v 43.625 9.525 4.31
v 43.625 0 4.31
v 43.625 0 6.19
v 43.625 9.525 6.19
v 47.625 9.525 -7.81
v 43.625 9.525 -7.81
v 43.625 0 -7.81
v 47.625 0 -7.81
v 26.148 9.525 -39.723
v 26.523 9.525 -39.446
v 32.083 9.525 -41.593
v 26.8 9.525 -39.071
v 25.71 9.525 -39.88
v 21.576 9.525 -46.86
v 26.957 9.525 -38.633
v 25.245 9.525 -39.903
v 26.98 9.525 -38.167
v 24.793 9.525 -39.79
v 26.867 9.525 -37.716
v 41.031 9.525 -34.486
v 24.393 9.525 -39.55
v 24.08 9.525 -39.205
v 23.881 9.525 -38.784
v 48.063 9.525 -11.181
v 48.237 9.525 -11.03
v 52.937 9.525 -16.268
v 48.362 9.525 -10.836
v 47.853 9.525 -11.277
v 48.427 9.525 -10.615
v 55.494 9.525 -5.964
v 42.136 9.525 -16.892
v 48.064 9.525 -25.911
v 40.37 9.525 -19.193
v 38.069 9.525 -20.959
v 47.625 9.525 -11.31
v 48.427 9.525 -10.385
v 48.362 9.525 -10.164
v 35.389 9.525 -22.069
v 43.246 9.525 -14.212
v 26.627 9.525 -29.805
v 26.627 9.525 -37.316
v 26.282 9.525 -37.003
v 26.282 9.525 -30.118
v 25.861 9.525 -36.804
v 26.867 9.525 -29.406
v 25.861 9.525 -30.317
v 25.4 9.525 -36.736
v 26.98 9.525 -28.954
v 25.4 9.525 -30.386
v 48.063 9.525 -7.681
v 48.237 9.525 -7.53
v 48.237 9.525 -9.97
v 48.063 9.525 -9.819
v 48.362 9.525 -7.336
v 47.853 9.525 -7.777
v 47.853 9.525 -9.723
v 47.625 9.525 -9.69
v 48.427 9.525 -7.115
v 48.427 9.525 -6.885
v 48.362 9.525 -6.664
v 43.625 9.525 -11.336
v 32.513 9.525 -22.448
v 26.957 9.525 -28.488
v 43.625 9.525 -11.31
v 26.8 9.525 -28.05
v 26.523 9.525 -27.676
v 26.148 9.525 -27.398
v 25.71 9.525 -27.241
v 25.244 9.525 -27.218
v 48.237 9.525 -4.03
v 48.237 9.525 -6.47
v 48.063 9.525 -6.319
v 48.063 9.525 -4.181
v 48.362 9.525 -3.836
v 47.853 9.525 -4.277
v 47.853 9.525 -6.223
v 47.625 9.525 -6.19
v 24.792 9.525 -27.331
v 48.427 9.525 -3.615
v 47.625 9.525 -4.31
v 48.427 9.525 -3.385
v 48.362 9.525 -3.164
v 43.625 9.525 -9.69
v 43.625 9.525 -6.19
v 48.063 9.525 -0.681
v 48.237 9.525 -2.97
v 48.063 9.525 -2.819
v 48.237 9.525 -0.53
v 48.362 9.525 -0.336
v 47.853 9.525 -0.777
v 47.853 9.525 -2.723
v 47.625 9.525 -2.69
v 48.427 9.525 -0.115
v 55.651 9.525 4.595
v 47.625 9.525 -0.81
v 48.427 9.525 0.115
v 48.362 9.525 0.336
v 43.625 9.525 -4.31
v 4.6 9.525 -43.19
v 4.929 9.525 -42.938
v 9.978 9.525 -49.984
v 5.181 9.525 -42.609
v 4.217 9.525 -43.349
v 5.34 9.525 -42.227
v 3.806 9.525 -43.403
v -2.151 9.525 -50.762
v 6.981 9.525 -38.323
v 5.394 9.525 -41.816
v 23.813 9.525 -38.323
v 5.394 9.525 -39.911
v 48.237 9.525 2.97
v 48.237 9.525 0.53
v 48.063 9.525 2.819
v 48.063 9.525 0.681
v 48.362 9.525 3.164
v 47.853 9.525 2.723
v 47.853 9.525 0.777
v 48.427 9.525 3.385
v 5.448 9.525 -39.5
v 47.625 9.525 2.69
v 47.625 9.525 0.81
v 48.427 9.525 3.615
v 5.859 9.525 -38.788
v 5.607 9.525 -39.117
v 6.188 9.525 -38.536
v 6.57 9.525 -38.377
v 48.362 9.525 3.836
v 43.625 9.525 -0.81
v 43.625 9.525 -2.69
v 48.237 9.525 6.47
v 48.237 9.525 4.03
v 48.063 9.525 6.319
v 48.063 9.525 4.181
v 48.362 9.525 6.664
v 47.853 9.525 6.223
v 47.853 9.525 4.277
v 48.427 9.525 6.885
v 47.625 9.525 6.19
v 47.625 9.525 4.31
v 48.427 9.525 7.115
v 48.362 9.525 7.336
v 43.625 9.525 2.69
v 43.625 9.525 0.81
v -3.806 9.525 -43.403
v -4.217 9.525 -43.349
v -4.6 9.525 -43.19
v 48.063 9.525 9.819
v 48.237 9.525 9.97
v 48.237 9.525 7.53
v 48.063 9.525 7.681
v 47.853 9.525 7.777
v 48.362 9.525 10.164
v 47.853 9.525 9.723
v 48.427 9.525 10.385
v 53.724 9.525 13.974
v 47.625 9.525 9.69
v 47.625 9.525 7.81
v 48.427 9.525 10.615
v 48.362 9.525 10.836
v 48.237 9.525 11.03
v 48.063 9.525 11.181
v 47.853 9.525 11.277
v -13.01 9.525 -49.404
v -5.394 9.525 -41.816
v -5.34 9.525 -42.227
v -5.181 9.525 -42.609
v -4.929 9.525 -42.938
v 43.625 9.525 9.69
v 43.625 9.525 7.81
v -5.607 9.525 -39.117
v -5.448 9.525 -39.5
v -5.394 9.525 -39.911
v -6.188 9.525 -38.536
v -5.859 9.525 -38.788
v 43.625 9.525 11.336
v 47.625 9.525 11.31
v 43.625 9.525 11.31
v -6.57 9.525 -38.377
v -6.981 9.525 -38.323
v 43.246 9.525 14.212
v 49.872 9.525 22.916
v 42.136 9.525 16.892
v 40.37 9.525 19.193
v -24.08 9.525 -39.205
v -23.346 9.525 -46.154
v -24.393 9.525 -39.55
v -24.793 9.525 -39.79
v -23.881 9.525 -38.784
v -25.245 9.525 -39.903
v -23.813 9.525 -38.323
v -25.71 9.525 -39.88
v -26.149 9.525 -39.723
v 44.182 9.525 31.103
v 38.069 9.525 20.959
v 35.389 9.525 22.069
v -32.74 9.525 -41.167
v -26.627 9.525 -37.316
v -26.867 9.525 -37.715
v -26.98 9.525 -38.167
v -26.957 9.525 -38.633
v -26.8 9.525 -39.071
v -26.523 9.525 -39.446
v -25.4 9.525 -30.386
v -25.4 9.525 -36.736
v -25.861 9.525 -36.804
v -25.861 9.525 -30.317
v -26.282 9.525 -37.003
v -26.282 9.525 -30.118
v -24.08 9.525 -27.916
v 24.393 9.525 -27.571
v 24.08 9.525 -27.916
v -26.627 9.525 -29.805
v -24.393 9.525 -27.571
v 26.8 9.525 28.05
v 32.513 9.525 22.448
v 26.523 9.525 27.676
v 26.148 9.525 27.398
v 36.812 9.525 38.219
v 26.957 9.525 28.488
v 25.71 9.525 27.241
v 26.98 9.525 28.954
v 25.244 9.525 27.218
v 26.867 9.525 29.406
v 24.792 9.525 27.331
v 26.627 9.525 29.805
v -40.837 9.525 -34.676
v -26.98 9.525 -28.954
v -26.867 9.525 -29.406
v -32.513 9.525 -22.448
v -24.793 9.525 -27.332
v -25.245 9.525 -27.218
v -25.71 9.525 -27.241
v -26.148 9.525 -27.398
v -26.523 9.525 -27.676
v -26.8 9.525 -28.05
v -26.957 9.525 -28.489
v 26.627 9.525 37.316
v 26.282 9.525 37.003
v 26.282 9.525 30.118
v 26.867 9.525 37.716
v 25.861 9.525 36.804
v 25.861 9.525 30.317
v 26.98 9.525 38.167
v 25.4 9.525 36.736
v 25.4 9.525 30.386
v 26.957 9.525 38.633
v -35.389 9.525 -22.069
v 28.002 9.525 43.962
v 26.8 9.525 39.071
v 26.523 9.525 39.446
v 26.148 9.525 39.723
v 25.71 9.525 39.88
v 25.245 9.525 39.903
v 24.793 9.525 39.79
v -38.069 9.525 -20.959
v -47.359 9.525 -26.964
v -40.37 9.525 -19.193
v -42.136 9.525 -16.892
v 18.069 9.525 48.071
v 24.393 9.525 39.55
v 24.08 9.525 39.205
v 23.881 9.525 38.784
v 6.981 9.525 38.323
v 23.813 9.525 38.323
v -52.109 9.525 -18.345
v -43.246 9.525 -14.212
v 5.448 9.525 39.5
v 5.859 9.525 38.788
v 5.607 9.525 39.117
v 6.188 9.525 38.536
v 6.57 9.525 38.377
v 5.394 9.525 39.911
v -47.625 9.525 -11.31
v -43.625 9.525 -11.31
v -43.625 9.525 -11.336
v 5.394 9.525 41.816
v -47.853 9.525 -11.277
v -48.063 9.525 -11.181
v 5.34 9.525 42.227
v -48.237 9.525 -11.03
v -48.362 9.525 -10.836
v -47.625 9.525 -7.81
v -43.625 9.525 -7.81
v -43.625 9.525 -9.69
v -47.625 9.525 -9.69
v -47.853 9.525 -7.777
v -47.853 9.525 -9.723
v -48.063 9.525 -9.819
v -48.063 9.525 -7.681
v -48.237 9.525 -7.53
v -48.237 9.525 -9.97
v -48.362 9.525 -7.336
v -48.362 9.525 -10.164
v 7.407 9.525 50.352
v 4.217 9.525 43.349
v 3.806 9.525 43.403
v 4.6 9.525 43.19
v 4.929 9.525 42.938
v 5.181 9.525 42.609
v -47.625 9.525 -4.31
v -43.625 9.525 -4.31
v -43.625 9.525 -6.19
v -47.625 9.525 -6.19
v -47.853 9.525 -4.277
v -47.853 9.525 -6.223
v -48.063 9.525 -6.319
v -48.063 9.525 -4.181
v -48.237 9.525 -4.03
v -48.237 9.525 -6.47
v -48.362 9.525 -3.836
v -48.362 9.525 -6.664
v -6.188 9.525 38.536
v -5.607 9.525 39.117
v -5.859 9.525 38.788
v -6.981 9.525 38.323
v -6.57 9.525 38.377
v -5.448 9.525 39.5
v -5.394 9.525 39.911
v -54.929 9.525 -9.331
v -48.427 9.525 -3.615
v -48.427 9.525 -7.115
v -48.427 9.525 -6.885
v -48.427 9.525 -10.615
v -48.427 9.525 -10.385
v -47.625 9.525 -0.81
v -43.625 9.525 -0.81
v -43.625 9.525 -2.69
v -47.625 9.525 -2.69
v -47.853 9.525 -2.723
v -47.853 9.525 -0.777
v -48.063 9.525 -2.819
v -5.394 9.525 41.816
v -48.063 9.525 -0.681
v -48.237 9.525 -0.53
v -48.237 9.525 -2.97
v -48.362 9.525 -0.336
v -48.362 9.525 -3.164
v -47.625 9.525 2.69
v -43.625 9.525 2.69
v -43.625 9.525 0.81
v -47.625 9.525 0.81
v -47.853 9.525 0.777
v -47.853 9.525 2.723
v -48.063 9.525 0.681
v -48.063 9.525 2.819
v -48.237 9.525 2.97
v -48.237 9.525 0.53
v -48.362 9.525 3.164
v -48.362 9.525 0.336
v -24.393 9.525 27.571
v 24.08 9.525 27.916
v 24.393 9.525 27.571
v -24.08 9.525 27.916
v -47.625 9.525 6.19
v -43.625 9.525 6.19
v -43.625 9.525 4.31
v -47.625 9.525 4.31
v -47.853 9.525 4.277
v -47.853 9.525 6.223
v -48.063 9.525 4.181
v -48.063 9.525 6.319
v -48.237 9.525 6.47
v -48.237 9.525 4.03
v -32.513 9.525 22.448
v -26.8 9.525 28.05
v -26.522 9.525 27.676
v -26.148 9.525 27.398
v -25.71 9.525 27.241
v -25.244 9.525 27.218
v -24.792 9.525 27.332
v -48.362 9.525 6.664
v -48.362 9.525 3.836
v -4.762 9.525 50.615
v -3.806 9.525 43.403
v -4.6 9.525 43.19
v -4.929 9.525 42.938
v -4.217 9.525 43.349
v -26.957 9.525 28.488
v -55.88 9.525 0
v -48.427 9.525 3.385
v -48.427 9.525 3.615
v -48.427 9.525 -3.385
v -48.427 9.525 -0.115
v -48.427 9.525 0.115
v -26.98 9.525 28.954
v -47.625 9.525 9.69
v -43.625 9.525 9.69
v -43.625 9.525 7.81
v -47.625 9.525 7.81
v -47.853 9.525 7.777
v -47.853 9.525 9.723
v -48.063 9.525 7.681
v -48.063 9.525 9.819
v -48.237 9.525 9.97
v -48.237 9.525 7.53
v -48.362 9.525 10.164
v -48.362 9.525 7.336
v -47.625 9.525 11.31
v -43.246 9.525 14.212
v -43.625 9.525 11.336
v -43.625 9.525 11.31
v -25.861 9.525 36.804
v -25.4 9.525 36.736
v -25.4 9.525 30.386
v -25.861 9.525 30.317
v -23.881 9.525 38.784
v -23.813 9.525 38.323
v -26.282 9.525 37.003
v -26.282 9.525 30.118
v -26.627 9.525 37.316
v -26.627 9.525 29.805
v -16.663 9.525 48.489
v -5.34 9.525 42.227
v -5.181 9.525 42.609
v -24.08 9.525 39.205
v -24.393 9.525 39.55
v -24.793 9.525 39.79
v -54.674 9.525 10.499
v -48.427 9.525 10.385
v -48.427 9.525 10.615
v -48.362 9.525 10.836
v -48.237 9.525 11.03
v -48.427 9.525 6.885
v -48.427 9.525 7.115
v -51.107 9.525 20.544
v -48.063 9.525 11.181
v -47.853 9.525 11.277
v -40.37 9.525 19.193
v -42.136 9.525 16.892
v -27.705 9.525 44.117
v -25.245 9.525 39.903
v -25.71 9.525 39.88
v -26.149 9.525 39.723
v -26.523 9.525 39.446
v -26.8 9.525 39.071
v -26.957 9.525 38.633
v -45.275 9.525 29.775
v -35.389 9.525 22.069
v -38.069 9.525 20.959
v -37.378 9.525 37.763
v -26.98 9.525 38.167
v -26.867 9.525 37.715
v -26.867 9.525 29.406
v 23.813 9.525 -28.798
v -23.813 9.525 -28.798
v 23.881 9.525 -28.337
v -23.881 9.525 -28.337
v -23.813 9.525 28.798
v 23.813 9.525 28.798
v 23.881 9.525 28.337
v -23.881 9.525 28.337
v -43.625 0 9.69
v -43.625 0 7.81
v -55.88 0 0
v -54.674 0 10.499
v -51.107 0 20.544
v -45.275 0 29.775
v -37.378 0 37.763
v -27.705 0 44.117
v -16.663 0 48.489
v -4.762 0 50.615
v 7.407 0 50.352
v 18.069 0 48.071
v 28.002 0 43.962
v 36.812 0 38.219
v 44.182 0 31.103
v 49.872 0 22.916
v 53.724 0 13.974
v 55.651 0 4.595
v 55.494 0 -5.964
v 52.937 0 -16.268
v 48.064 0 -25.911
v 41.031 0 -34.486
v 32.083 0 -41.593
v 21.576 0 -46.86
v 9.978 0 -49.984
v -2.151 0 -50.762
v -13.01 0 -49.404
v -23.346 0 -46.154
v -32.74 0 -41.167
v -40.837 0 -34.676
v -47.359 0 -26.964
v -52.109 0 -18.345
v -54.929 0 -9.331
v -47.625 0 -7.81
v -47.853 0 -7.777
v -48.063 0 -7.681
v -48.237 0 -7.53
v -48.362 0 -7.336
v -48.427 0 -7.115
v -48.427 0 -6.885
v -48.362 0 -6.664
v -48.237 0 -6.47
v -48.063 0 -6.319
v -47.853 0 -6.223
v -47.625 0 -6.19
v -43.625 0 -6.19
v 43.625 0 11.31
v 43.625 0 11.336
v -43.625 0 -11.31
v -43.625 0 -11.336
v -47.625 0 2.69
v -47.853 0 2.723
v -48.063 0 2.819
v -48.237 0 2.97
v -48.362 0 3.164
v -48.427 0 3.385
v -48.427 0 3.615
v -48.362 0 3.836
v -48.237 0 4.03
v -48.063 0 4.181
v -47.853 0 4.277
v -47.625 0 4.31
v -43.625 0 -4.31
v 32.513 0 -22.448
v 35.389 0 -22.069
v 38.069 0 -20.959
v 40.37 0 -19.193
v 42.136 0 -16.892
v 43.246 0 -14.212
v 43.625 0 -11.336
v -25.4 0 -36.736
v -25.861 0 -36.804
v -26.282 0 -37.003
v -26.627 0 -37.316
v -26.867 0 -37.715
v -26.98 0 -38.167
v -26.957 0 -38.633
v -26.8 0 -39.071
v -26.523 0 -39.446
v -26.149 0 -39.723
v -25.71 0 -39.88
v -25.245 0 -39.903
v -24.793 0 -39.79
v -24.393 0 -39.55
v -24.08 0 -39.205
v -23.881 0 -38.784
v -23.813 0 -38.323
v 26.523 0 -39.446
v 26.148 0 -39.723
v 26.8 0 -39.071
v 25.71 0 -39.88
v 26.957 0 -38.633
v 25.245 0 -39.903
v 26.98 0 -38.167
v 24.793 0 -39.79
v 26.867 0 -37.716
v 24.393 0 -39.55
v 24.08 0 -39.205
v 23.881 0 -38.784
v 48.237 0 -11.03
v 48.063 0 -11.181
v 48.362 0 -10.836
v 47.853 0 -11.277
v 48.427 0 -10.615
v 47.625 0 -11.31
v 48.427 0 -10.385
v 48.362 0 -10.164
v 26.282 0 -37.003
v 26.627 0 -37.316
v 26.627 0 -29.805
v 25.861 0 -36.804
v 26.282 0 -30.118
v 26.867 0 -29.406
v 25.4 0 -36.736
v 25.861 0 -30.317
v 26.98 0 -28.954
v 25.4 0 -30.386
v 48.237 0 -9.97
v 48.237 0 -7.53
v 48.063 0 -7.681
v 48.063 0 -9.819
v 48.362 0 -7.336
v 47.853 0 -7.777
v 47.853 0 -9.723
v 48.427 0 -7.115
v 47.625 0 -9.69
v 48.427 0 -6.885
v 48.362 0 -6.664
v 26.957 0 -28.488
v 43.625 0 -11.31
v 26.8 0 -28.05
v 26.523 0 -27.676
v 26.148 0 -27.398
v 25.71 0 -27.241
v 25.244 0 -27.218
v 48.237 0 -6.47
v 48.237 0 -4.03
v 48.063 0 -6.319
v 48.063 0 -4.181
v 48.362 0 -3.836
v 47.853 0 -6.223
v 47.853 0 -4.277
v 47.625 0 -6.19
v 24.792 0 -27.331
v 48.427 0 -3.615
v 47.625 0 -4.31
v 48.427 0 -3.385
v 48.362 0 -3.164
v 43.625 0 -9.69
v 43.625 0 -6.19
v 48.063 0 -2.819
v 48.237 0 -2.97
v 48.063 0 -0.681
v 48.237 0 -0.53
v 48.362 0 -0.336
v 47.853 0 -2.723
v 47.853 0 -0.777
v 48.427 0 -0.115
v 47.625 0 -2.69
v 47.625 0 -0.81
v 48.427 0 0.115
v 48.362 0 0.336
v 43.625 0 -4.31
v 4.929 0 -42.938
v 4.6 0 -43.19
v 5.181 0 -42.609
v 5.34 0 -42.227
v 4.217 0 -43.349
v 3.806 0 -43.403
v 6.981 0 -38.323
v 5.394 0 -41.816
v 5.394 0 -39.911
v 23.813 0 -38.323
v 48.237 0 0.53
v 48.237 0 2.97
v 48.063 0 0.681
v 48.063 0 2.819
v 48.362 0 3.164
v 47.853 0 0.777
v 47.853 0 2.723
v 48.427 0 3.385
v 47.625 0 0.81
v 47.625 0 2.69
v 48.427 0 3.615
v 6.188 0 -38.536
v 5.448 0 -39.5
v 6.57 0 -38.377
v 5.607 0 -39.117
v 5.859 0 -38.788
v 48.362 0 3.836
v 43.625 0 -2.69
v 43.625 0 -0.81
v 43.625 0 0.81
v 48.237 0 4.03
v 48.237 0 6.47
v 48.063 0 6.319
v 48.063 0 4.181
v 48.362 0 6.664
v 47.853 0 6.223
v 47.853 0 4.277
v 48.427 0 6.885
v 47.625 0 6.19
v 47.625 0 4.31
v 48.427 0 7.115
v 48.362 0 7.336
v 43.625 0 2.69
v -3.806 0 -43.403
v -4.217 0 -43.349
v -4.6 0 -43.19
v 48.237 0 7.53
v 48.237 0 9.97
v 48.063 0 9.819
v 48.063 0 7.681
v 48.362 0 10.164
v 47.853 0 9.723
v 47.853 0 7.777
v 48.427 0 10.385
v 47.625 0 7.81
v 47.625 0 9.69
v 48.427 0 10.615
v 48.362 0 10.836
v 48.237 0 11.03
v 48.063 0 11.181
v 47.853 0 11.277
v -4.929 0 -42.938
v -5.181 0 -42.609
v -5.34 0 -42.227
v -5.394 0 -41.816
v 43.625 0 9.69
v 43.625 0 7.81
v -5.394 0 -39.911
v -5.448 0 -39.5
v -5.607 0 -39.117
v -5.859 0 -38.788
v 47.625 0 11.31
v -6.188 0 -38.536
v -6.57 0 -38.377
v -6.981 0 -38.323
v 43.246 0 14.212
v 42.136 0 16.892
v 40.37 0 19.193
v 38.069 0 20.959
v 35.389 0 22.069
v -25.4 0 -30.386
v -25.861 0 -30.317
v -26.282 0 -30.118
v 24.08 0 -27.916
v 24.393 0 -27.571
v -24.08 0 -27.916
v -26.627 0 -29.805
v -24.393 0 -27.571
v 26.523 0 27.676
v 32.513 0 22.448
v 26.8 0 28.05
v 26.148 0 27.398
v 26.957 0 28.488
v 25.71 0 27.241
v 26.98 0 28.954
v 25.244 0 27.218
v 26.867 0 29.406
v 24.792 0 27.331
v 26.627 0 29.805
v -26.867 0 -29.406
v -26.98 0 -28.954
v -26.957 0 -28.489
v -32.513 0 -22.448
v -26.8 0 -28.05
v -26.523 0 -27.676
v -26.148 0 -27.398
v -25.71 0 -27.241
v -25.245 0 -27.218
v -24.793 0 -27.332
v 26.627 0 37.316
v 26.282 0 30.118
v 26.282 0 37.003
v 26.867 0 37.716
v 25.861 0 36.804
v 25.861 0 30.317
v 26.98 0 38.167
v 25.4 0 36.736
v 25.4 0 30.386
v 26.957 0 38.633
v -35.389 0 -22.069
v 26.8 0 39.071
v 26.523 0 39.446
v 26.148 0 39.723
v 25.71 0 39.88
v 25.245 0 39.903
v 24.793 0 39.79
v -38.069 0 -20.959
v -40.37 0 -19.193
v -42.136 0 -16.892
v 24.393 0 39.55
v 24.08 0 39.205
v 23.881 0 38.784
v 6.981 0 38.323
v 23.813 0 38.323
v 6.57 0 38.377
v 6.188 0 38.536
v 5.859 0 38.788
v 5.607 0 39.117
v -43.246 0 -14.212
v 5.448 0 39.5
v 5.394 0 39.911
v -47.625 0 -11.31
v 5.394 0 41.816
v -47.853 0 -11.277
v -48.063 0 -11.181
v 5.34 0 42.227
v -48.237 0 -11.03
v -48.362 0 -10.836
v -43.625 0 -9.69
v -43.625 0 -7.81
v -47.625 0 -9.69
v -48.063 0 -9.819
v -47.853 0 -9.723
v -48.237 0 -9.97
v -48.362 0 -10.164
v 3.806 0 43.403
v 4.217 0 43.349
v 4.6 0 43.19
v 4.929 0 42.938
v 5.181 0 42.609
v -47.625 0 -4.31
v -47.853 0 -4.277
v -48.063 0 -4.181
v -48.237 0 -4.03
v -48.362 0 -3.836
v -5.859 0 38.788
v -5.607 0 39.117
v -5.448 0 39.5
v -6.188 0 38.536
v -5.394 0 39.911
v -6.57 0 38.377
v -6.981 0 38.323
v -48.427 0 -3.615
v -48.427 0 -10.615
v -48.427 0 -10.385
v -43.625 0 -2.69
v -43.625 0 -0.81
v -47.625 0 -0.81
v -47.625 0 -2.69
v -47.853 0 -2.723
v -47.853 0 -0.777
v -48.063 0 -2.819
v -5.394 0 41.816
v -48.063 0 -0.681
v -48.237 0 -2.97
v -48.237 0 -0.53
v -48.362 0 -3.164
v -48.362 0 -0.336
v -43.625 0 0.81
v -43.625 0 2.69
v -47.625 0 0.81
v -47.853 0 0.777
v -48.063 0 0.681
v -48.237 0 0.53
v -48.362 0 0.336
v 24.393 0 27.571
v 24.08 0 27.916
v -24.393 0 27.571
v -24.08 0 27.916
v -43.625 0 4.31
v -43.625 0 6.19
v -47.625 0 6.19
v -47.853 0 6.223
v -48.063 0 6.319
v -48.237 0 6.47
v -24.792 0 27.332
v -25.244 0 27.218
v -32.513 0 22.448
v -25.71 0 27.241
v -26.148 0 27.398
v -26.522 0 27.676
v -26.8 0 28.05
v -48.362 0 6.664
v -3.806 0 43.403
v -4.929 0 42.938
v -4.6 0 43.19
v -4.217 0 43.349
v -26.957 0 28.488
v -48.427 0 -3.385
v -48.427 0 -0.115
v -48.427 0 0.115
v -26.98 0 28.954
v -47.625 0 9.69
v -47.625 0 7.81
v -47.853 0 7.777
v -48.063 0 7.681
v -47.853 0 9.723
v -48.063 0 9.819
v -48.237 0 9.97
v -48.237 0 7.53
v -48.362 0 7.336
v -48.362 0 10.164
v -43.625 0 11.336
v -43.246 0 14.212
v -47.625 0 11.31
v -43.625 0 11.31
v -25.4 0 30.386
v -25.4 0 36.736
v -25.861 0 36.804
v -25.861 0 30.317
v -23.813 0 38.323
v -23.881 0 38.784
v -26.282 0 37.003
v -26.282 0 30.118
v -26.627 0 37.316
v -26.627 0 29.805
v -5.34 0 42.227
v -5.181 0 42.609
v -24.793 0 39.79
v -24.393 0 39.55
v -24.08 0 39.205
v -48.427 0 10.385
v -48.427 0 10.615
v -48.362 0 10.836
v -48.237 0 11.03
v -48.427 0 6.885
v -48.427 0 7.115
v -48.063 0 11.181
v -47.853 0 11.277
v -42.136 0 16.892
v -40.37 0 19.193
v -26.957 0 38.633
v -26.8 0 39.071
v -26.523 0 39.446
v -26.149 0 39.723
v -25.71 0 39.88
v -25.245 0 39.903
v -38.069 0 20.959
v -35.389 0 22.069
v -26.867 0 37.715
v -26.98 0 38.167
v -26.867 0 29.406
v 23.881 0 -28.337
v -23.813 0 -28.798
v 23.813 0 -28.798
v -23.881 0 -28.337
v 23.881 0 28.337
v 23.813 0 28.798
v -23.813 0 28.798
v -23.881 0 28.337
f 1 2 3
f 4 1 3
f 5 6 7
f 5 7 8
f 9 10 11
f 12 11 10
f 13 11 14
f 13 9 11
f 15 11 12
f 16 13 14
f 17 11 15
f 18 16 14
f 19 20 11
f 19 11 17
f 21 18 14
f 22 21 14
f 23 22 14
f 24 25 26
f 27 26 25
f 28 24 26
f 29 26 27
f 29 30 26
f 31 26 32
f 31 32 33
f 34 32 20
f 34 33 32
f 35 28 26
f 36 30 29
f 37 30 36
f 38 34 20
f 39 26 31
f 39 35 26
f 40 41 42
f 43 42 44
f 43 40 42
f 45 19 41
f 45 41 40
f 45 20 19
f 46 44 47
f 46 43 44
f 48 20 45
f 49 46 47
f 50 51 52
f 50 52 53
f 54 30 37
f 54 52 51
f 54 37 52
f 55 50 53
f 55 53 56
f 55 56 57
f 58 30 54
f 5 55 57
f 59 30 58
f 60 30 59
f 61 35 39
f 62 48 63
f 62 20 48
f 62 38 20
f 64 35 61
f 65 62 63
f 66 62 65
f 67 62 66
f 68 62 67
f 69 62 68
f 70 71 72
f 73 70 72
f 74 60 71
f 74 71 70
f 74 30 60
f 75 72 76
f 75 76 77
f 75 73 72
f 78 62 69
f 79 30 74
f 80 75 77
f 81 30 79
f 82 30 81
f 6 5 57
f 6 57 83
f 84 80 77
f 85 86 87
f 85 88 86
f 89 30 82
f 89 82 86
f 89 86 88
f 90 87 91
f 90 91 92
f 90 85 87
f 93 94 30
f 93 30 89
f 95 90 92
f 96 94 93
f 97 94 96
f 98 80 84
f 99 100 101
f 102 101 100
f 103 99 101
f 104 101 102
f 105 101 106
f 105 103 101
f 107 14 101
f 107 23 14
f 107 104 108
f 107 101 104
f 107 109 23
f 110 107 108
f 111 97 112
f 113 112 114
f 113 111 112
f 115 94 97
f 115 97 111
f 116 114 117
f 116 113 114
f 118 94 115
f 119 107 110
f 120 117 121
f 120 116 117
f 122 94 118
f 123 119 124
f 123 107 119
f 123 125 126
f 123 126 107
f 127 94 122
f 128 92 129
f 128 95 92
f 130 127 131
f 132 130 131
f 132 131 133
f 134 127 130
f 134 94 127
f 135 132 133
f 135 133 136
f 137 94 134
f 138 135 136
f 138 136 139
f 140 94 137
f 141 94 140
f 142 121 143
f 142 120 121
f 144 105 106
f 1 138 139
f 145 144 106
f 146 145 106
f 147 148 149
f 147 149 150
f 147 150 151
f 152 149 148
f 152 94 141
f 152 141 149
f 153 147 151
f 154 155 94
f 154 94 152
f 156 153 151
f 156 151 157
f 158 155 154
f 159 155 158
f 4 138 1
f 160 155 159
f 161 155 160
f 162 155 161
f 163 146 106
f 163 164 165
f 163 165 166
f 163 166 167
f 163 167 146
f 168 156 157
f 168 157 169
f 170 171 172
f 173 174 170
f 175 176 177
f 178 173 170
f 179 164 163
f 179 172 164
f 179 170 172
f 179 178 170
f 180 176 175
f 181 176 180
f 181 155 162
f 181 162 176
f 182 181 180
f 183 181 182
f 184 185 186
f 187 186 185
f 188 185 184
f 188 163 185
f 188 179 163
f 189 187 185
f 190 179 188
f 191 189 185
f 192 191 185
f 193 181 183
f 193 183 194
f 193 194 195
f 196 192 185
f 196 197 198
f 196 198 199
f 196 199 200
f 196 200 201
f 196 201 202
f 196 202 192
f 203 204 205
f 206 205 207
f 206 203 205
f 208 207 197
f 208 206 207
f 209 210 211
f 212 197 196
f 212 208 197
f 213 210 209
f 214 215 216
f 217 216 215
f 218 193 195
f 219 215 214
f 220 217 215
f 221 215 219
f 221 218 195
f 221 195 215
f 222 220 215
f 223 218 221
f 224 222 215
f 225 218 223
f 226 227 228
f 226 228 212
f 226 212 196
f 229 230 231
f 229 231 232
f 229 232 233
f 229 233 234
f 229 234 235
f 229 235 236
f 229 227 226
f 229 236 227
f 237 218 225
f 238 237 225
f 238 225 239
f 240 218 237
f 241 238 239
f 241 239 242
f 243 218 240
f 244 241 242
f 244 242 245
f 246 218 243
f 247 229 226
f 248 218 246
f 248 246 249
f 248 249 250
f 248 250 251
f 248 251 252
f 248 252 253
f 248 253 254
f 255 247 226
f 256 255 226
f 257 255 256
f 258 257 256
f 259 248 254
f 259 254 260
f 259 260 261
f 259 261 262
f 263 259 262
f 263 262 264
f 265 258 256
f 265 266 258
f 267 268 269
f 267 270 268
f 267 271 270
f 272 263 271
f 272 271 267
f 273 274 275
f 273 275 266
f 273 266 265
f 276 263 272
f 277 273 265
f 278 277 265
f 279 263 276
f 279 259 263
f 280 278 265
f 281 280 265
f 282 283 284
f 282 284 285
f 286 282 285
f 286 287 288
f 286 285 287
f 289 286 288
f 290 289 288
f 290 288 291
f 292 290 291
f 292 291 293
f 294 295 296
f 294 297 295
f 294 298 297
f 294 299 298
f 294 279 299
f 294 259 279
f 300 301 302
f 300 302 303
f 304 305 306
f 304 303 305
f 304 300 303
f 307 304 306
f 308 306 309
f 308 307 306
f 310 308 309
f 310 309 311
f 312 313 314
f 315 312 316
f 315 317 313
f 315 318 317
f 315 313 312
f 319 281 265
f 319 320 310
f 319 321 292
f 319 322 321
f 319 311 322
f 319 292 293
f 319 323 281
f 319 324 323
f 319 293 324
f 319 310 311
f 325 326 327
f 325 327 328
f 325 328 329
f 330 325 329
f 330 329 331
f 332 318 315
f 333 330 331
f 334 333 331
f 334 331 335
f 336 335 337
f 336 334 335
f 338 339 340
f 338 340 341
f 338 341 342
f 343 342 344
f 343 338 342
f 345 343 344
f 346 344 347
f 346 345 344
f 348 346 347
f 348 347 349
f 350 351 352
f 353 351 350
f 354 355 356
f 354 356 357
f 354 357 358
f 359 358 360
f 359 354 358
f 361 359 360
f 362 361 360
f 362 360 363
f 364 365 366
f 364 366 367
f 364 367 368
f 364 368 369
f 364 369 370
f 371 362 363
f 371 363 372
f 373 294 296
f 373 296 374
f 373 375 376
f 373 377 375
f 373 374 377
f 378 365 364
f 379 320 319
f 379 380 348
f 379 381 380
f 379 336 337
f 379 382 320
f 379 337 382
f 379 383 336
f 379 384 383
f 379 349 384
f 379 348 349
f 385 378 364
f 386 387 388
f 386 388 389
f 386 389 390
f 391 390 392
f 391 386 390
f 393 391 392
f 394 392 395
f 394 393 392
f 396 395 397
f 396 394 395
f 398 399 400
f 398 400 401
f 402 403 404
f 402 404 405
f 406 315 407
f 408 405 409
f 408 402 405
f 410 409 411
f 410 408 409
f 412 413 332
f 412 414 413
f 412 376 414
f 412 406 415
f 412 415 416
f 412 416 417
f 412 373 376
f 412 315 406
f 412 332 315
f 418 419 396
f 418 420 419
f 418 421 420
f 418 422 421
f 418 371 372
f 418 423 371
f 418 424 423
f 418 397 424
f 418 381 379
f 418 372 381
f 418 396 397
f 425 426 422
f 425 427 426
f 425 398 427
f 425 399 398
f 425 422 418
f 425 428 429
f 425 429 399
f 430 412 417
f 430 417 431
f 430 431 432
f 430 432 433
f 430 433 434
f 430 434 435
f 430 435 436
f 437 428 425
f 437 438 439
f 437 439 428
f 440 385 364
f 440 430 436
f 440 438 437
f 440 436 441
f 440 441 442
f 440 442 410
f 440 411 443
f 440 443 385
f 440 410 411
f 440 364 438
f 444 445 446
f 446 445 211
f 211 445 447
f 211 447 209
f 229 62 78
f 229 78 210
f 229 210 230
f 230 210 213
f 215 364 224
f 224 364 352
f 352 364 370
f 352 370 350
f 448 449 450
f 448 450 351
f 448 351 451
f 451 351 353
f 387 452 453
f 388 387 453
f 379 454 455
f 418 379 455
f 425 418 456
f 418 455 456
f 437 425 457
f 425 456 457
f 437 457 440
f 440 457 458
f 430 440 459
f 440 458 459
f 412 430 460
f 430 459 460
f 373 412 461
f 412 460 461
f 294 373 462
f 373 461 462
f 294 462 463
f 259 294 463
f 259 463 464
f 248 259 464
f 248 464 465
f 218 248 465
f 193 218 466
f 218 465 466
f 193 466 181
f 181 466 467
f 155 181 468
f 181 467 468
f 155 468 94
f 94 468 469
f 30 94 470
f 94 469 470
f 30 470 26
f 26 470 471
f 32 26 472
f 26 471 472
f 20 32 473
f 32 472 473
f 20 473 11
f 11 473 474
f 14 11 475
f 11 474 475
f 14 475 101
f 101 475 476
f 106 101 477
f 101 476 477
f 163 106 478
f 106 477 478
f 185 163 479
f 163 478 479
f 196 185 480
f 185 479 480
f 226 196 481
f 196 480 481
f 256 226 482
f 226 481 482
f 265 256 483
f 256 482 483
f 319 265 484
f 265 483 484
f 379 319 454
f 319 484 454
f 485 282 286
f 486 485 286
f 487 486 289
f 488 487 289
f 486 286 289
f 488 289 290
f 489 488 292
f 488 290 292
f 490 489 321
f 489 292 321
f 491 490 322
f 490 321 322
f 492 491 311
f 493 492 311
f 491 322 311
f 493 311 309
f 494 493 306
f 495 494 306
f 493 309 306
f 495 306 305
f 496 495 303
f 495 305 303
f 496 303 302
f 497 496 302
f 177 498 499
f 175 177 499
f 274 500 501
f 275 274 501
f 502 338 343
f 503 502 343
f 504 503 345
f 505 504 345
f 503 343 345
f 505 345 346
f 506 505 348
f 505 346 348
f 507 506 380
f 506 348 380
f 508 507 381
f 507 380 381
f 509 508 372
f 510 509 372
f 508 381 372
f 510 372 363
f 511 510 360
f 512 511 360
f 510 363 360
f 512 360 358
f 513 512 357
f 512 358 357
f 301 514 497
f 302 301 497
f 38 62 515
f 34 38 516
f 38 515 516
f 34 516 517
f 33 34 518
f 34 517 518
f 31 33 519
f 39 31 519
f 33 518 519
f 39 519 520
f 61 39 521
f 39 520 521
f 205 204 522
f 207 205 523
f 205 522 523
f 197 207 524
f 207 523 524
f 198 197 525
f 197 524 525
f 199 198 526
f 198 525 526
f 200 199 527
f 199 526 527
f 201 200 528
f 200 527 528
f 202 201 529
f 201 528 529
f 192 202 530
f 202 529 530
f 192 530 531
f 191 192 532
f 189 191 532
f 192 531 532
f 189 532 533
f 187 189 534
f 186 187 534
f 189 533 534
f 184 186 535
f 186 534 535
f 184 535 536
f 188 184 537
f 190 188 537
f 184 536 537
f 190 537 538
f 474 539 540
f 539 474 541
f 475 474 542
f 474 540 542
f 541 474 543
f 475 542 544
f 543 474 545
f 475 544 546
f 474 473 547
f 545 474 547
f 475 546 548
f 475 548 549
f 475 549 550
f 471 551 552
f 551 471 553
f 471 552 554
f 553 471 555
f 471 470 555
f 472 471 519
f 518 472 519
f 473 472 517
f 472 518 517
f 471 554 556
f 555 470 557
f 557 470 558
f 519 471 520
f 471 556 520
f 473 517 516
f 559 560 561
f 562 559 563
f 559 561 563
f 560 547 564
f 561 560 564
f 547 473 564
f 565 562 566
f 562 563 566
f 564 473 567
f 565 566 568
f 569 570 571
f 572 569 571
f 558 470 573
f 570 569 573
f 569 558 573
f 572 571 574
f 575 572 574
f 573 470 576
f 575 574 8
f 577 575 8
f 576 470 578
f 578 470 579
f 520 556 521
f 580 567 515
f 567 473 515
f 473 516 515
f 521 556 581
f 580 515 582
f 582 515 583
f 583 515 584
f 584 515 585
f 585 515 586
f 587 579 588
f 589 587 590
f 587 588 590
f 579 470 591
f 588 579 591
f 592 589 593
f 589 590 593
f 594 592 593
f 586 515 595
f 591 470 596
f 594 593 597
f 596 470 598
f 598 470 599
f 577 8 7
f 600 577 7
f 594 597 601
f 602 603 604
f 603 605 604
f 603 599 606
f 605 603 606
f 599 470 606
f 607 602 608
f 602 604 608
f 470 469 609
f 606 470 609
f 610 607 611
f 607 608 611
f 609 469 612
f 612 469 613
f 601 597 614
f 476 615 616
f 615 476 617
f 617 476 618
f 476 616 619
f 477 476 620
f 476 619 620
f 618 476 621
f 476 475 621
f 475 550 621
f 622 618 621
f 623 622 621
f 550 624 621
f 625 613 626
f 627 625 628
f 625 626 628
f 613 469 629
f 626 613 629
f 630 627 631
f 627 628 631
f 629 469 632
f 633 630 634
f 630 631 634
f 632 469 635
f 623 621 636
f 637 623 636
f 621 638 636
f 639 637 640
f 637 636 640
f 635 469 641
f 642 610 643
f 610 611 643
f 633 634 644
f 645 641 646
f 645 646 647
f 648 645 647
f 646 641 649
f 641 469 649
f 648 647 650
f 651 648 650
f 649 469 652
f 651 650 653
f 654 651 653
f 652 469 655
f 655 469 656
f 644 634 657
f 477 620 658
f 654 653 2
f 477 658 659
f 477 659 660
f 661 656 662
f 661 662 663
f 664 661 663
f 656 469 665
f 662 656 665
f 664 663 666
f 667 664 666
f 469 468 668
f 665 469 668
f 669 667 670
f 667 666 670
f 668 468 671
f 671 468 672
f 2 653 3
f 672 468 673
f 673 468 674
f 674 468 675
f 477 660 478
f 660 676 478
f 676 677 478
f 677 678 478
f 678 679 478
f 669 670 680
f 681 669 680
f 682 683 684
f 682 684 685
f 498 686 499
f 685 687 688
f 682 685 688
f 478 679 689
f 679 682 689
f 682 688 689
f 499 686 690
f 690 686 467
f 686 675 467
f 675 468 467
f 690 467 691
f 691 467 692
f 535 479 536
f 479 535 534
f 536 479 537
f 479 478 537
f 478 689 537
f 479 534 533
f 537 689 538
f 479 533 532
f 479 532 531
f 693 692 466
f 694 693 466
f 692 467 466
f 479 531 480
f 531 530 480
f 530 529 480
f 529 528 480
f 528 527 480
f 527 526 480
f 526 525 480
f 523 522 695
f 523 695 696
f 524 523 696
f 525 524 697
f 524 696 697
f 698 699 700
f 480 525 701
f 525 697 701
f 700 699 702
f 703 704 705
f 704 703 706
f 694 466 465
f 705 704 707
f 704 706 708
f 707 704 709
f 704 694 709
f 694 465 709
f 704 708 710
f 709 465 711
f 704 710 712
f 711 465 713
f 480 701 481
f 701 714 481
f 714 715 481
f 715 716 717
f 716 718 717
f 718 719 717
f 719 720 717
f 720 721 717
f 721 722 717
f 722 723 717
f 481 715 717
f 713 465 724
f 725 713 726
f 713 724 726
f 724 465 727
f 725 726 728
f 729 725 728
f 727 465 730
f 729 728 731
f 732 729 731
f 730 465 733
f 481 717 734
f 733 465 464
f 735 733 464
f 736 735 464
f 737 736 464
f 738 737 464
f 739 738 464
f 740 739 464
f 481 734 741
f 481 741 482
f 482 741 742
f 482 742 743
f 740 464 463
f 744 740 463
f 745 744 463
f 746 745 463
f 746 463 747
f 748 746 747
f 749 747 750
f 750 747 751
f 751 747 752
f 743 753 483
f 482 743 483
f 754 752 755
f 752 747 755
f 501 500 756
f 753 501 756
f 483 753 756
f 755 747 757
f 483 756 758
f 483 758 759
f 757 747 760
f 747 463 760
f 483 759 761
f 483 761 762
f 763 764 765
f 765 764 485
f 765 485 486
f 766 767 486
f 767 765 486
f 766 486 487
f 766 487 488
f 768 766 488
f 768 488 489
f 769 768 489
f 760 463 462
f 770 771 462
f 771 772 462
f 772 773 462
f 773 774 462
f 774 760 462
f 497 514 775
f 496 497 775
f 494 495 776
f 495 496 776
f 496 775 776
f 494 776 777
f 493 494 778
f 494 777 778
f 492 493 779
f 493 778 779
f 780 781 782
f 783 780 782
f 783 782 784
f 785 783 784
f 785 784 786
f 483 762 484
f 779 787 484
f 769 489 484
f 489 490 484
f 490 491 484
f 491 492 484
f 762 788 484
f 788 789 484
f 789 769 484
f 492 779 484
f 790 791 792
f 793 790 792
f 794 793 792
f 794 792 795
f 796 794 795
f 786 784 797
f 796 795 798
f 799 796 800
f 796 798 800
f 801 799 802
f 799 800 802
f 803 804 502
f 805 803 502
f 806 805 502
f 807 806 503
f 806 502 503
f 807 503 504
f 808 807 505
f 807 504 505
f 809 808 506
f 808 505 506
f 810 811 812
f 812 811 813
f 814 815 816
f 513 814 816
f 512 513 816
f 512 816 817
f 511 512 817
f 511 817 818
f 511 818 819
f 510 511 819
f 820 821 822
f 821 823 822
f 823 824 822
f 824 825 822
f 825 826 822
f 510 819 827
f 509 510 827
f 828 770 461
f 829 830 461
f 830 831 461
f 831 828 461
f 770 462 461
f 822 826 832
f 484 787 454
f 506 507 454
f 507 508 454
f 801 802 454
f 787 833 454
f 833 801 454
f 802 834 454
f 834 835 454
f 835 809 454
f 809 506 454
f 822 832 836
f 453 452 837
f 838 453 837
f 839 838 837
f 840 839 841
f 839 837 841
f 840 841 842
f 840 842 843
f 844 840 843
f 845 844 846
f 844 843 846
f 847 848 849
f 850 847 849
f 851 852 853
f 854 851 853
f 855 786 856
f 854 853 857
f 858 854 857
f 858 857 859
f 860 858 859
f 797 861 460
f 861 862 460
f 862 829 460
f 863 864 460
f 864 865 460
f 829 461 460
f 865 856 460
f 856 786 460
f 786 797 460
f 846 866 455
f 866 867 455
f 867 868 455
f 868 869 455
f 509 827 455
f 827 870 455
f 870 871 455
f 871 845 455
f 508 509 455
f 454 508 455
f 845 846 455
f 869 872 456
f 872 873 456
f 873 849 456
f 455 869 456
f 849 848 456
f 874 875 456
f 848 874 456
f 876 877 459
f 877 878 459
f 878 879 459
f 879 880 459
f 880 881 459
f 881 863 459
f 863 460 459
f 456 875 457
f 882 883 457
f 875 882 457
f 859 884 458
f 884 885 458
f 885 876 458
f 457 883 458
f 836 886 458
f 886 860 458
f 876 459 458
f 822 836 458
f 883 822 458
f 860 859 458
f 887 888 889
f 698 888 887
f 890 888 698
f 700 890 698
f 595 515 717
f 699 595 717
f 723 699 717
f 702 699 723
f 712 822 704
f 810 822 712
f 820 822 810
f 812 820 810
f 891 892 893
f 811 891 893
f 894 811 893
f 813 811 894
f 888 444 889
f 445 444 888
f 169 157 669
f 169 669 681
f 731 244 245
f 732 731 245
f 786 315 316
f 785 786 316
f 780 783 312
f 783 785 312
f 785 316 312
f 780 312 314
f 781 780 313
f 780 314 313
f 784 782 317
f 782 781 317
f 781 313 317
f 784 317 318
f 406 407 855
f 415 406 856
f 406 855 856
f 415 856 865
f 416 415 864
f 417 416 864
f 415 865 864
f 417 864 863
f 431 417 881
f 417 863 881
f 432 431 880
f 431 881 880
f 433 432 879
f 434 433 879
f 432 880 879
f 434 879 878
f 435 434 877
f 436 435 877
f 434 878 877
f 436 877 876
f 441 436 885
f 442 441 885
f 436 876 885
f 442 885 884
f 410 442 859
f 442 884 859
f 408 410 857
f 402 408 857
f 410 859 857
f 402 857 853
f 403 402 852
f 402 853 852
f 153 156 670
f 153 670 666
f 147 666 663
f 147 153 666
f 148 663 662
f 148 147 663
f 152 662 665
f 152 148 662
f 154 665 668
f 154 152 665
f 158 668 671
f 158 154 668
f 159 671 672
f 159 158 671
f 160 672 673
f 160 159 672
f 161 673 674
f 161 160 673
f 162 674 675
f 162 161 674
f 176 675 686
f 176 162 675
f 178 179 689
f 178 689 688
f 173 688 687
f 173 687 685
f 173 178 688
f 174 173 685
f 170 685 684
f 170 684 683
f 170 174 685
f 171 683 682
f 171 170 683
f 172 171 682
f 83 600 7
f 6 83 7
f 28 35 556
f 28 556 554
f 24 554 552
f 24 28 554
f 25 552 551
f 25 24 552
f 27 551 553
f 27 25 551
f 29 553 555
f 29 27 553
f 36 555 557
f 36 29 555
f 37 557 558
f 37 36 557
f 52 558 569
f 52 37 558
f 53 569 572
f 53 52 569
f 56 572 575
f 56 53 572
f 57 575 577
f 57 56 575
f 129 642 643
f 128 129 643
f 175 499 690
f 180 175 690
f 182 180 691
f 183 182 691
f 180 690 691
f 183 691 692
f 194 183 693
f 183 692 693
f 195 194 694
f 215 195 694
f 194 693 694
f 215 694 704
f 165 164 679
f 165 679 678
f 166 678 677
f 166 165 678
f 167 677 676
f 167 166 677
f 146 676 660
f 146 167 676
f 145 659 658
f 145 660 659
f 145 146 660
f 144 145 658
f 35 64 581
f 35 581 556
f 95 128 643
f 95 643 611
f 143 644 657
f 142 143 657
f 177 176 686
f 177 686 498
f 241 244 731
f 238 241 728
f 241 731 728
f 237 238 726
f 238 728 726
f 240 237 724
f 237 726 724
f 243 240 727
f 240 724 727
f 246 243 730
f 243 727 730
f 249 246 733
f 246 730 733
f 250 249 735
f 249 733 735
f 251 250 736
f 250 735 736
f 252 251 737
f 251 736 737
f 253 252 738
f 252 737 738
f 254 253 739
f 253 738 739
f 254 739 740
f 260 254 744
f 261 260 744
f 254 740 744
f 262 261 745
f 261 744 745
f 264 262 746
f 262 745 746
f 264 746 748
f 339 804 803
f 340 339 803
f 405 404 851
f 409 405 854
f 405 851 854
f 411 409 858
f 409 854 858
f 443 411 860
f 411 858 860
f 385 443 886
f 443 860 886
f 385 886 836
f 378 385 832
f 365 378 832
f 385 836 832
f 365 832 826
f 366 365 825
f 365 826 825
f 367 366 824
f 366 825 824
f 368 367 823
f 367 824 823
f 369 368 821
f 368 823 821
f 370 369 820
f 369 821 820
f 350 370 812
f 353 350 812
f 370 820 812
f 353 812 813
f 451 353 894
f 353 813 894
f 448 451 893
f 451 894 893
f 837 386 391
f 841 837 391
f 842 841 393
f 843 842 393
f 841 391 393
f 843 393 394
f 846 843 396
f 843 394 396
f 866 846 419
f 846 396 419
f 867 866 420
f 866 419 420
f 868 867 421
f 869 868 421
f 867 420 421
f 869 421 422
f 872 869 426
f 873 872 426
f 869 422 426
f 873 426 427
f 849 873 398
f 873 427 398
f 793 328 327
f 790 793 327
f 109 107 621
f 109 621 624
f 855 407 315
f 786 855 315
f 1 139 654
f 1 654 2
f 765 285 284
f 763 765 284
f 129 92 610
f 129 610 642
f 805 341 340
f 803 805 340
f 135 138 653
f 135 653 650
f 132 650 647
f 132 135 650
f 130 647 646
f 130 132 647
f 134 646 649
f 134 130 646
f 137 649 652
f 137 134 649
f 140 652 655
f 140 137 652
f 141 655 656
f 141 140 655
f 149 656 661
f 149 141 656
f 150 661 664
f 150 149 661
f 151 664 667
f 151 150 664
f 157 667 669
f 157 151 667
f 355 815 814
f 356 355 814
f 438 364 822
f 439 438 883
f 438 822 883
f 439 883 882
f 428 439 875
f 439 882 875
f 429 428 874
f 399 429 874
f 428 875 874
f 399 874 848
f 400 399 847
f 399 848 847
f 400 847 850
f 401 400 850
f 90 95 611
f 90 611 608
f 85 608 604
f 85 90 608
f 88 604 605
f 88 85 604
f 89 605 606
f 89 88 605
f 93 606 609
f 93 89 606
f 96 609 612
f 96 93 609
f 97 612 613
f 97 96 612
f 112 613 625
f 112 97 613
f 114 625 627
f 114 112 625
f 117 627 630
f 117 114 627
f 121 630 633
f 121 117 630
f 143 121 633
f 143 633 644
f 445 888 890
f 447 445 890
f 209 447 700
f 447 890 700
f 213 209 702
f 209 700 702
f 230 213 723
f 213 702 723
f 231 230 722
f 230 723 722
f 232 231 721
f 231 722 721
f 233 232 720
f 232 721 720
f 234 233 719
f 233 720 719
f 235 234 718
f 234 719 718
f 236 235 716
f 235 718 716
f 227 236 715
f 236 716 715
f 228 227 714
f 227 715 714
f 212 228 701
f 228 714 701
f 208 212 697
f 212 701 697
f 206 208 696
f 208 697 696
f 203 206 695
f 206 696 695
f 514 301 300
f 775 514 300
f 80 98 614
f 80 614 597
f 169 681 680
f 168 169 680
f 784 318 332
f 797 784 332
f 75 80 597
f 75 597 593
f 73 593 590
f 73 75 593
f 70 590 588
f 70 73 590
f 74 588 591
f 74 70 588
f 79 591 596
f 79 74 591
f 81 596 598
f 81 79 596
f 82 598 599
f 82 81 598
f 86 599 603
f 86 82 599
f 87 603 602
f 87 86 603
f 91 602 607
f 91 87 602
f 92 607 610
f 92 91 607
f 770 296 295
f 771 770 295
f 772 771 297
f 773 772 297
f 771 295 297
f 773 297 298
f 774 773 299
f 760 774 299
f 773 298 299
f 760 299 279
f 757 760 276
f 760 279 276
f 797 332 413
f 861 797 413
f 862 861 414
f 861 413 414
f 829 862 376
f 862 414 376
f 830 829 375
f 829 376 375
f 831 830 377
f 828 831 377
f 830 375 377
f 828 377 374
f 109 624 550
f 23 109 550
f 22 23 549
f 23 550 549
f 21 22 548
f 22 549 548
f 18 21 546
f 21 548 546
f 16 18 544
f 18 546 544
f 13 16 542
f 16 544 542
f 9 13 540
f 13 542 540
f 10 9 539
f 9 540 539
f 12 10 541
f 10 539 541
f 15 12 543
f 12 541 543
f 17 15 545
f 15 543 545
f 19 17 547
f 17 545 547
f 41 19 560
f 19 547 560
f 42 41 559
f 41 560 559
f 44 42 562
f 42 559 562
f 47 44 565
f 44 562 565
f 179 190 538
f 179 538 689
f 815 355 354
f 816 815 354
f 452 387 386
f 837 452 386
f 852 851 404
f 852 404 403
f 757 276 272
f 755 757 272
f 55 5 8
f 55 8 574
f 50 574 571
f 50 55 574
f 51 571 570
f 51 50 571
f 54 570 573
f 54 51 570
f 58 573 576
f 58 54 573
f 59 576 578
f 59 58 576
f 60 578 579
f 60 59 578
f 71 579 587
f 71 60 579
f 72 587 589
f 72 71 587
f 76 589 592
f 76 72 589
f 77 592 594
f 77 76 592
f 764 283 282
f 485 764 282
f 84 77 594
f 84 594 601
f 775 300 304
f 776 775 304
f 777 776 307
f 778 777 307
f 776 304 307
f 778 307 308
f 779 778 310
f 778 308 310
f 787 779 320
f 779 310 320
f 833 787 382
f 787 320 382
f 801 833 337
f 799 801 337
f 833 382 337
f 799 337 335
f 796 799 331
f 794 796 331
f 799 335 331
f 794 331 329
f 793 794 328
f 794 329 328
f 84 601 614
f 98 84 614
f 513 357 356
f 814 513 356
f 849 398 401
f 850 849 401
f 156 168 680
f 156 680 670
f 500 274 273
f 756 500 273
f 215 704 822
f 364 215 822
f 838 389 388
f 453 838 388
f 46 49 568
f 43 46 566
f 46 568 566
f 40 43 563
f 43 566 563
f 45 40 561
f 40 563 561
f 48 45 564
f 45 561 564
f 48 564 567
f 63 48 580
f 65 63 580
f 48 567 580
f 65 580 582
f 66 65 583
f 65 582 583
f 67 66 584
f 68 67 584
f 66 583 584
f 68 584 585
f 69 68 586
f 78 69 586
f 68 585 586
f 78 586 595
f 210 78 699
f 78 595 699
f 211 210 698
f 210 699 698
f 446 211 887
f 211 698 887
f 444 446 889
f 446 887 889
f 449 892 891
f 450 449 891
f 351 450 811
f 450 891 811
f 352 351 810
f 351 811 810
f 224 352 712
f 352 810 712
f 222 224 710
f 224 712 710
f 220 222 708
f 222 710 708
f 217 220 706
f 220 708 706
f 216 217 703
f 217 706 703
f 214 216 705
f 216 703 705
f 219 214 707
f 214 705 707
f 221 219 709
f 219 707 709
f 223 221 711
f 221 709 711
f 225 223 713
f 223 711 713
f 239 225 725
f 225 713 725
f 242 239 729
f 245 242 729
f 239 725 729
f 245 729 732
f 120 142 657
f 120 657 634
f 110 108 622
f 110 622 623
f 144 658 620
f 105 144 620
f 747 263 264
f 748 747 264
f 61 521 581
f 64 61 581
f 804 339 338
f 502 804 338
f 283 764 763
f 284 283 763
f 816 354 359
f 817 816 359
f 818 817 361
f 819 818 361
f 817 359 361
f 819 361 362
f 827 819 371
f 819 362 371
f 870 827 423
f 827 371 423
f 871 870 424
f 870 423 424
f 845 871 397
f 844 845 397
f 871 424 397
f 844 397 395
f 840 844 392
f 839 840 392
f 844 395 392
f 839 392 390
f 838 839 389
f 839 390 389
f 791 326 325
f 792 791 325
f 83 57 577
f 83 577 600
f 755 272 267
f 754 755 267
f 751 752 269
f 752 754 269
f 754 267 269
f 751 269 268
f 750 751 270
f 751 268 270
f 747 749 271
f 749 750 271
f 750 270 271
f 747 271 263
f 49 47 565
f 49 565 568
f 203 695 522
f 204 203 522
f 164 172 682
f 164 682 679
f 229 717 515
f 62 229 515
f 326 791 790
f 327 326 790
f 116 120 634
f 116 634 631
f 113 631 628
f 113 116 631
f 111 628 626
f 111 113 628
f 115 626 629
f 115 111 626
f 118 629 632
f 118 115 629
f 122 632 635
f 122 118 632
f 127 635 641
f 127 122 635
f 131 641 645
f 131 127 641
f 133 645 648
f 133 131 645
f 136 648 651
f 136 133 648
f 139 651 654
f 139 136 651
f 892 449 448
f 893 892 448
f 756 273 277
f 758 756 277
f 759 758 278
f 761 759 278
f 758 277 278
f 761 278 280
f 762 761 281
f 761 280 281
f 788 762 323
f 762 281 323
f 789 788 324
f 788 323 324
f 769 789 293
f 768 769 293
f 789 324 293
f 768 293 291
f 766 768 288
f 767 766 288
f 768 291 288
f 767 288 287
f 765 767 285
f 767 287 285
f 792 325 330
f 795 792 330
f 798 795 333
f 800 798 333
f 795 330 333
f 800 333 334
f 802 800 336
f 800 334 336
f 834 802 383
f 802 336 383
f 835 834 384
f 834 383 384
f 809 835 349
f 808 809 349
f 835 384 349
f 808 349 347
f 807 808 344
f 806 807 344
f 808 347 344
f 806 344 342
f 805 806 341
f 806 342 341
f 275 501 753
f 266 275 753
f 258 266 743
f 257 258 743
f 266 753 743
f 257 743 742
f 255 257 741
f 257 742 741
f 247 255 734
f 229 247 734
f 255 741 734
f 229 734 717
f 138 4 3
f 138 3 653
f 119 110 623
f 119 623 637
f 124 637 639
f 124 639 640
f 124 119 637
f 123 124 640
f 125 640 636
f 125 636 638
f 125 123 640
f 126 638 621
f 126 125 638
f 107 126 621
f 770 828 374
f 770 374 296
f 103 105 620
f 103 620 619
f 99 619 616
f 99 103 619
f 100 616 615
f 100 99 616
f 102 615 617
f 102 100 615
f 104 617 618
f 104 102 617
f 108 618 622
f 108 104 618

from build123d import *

# Parameters (mm, degrees)
SKETCH11_RX                  = 55.88
SKETCH11_RY                  = 50.8
BOSS_EXTRUDE4_DEPTH          = 9.525
SKETCH14_R                   = 0.0001
CUT_EXTRUDE5_DEPTH           = 77.117934976
CUT_EXTRUDE4_DEPTH           = 77.117934976
LPATTERN1_COUNT              = 4
LPATTERN1_PITCH              = 3.5
LPATTERN1_COL_COUNT          = 4
LPATTERN1_COL_PITCH          = 3.5
MIRROR1_COPY_1_DEPTH         = 77.117934976
MIRROR1_COPY_2_DEPTH         = 77.117934976
MIRROR1_COPY_3_DEPTH         = 77.117934976
MIRROR1_COPY_4_DEPTH         = 77.117934976
MIRROR1_COPY_5_DEPTH         = 77.117934976
MIRROR1_COPY_6_DEPTH         = 77.117934976
MIRROR1_COPY_7_DEPTH         = 77.117934976
F_1_8_0_125_DIAMETER_HOLE1_D = 3.175


with BuildPart() as part:
    # Sketch11 → Boss-Extrude4 (new body)
    with BuildSketch(Plane(origin=(0, 0, 0), x_dir=(1, 0, 0), z_dir=(0, 1, 0))):
        with Locations(Location((0, 0), (0, 0, 180))):
            Ellipse(SKETCH11_RX, SKETCH11_RY)
        with BuildLine():
            Line((-32.5125, 22.448135593), (32.5125, 22.448135593))
            ThreePointArc((32.5125, 22.448135593), (40.370224106, 19.193359699), (43.625, 11.335635593))
            Line((43.625, 11.335635593), (43.625, -11.335635593))
            ThreePointArc((43.625, -11.335635593), (40.370224106, -19.193359699), (32.5125, -22.448135593))
            Line((32.5125, -22.448135593), (-32.5125, -22.448135593))
            ThreePointArc((-32.5125, -22.448135593), (-40.370224106, -19.193359699), (-43.625, -11.335635593))
            Line((-43.625, -11.335635593), (-43.625, 11.335635593))
            ThreePointArc((-43.625, 11.335635593), (-40.370224106, 19.193359699), (-32.5125, 22.448135593))
        make_face(mode=Mode.SUBTRACT)
    extrude(amount=BOSS_EXTRUDE4_DEPTH)

    # Sketch14 → Cut-Extrude5 (cut, through all)
    with BuildSketch(Plane(origin=(0, 9.525, 0), x_dir=(1, 0, 0), z_dir=(0, 1, 0))):
        with Locations((-25.4, 28.798235593)):
            Circle(SKETCH14_R)
        with Locations((25.4, 28.798235593)):
            Circle(SKETCH14_R)
        with Locations((25.4, 38.323035593)):
            Circle(SKETCH14_R)
        with Locations((-25.4, 38.323035593)):
            Circle(SKETCH14_R)
        with BuildLine():
            Line((-25.4, 38.323135593), (-6.981368472, 38.323135593))
            ThreePointArc((-6.981368472, 38.323135593), (-5.858836457, 38.788103578), (-5.393868472, 39.910635593))
            Line((-5.393868472, 39.910635593), (-5.393868472, 41.815635593))
            ThreePointArc((-5.393868472, 41.815635593), (-4.928900487, 42.938167608), (-3.806368472, 43.403135593))
            Line((-3.806368472, 43.403135593), (3.806368472, 43.403135593))
            ThreePointArc((3.806368472, 43.403135593), (4.928900487, 42.938167608), (5.393868472, 41.815635593))
            Line((5.393868472, 41.815635593), (5.393868472, 39.910635593))
            ThreePointArc((5.393868472, 39.910635593), (5.858836457, 38.788103578), (6.981368472, 38.323135593))
            Line((6.981368472, 38.323135593), (25.4001, 38.323035593))
            Line((25.4001, 38.323035593), (25.4, 28.798135593))
            Line((25.4, 28.798135593), (-25.4001, 28.798235593))
            Line((-25.4001, 28.798235593), (-25.4, 38.323135593))
        make_face()
    cut_extrude5 = extrude(amount=-CUT_EXTRUDE5_DEPTH, mode=Mode.SUBTRACT)

    # Sketch12 → Cut-Extrude4 (cut, through all)
    with BuildSketch(Plane(origin=(0, 9.525, 0), x_dir=(1, 0, 0), z_dir=(0, 1, 0))):
        with BuildLine():
            Line((-43.625, 0.81), (-47.625, 0.81))
            ThreePointArc((-47.625, 0.81), (-48.435, 0), (-47.625, -0.81))
            Line((-47.625, -0.81), (-43.625, -0.81))
            Line((-43.625, -0.81), (-43.625, 0.81))
        make_face()
    cut_extrude4 = extrude(amount=-CUT_EXTRUDE4_DEPTH, mode=Mode.SUBTRACT)

    # LPattern1: Cut-Extrude4 ×4
    with Locations(*[(0, 0, -i * LPATTERN1_PITCH) for i in range(1, LPATTERN1_COUNT)]):
        add(cut_extrude4, mode=Mode.SUBTRACT)

    # LPattern1 col: Cut-Extrude4 ×4
    with Locations(*[(0, 0, i * LPATTERN1_COL_PITCH) for i in range(1, LPATTERN1_COL_COUNT)]):
        add(cut_extrude4, mode=Mode.SUBTRACT)

    # Mirror1 copy 1 sketch → Mirror1 copy 1 (cut, through all)
    with BuildSketch(Plane(origin=(0, 9.525, -3.5), x_dir=(-1, 0, 0), z_dir=(0, 1, 0))):
        with BuildLine():
            Line((-43.625, -0.81), (-47.625, -0.81))
            ThreePointArc((-47.625, -0.81), (-48.435, 0), (-47.625, 0.81))
            Line((-47.625, 0.81), (-43.625, 0.81))
            Line((-43.625, 0.81), (-43.625, -0.81))
        make_face()
    extrude(amount=-MIRROR1_COPY_1_DEPTH, mode=Mode.SUBTRACT)

    # Mirror1 copy 2 sketch → Mirror1 copy 2 (cut, through all)
    with BuildSketch(Plane(origin=(0, 9.525, -7), x_dir=(-1, 0, 0), z_dir=(0, 1, 0))):
        with BuildLine():
            Line((-43.625, -0.81), (-47.625, -0.81))
            ThreePointArc((-47.625, -0.81), (-48.435, 0), (-47.625, 0.81))
            Line((-47.625, 0.81), (-43.625, 0.81))
            Line((-43.625, 0.81), (-43.625, -0.81))
        make_face()
    extrude(amount=-MIRROR1_COPY_2_DEPTH, mode=Mode.SUBTRACT)

    # Mirror1 copy 3 sketch → Mirror1 copy 3 (cut, through all)
    with BuildSketch(Plane(origin=(0, 9.525, -10.5), x_dir=(-1, 0, 0), z_dir=(0, 1, 0))):
        with BuildLine():
            Line((-43.625, -0.81), (-47.625, -0.81))
            ThreePointArc((-47.625, -0.81), (-48.435, 0), (-47.625, 0.81))
            Line((-47.625, 0.81), (-43.625, 0.81))
            Line((-43.625, 0.81), (-43.625, -0.81))
        make_face()
    extrude(amount=-MIRROR1_COPY_3_DEPTH, mode=Mode.SUBTRACT)

    # Mirror1 copy 4 sketch → Mirror1 copy 4 (cut, through all)
    with BuildSketch(Plane(origin=(0, 9.525, 3.5), x_dir=(-1, 0, 0), z_dir=(0, 1, 0))):
        with BuildLine():
            Line((-43.625, -0.81), (-47.625, -0.81))
            ThreePointArc((-47.625, -0.81), (-48.435, 0), (-47.625, 0.81))
            Line((-47.625, 0.81), (-43.625, 0.81))
            Line((-43.625, 0.81), (-43.625, -0.81))
        make_face()
    extrude(amount=-MIRROR1_COPY_4_DEPTH, mode=Mode.SUBTRACT)

    # Mirror1 copy 5 sketch → Mirror1 copy 5 (cut, through all)
    with BuildSketch(Plane(origin=(0, 9.525, 7), x_dir=(-1, 0, 0), z_dir=(0, 1, 0))):
        with BuildLine():
            Line((-43.625, -0.81), (-47.625, -0.81))
            ThreePointArc((-47.625, -0.81), (-48.435, 0), (-47.625, 0.81))
            Line((-47.625, 0.81), (-43.625, 0.81))
            Line((-43.625, 0.81), (-43.625, -0.81))
        make_face()
    extrude(amount=-MIRROR1_COPY_5_DEPTH, mode=Mode.SUBTRACT)

    # Mirror1 copy 6 sketch → Mirror1 copy 6 (cut, through all)
    with BuildSketch(Plane(origin=(0, 9.525, 10.5), x_dir=(-1, 0, 0), z_dir=(0, 1, 0))):
        with BuildLine():
            Line((-43.625, -0.81), (-47.625, -0.81))
            ThreePointArc((-47.625, -0.81), (-48.435, 0), (-47.625, 0.81))
            Line((-47.625, 0.81), (-43.625, 0.81))
            Line((-43.625, 0.81), (-43.625, -0.81))
        make_face()
    extrude(amount=-MIRROR1_COPY_6_DEPTH, mode=Mode.SUBTRACT)

    # Mirror1 copy 7 sketch → Mirror1 copy 7 (cut, through all)
    with BuildSketch(Plane(origin=(0, 9.525, 0), x_dir=(-1, 0, 0), z_dir=(0, 1, 0))):
        with BuildLine():
            Line((-43.625, -0.81), (-47.625, -0.81))
            ThreePointArc((-47.625, -0.81), (-48.435, 0), (-47.625, 0.81))
            Line((-47.625, 0.81), (-43.625, 0.81))
            Line((-43.625, 0.81), (-43.625, -0.81))
        make_face()
    extrude(amount=-MIRROR1_COPY_7_DEPTH, mode=Mode.SUBTRACT)

    # Mirror2: Cut-Extrude5 across plane
    add(cut_extrude5.mirror(Plane.XY), mode=Mode.SUBTRACT)

    # 1/8 (0.125) Diameter Hole1 (through all)
    with Locations(Plane(origin=(0, 9.525, 0), x_dir=(1, 0, 0), z_dir=(0, 1, 0))):
        with Locations((-25.4001, 28.798235593), (-25.4001, 38.323035593), (25.4001, 38.323035593), (25.4, 28.798135593), (-25.4, -28.798135593), (-25.4001, -38.323035593), (25.4, -28.798135593), (25.4001, -38.323035593)):
            Hole(F_1_8_0_125_DIAMETER_HOLE1_D / 2)


solid = part.part
